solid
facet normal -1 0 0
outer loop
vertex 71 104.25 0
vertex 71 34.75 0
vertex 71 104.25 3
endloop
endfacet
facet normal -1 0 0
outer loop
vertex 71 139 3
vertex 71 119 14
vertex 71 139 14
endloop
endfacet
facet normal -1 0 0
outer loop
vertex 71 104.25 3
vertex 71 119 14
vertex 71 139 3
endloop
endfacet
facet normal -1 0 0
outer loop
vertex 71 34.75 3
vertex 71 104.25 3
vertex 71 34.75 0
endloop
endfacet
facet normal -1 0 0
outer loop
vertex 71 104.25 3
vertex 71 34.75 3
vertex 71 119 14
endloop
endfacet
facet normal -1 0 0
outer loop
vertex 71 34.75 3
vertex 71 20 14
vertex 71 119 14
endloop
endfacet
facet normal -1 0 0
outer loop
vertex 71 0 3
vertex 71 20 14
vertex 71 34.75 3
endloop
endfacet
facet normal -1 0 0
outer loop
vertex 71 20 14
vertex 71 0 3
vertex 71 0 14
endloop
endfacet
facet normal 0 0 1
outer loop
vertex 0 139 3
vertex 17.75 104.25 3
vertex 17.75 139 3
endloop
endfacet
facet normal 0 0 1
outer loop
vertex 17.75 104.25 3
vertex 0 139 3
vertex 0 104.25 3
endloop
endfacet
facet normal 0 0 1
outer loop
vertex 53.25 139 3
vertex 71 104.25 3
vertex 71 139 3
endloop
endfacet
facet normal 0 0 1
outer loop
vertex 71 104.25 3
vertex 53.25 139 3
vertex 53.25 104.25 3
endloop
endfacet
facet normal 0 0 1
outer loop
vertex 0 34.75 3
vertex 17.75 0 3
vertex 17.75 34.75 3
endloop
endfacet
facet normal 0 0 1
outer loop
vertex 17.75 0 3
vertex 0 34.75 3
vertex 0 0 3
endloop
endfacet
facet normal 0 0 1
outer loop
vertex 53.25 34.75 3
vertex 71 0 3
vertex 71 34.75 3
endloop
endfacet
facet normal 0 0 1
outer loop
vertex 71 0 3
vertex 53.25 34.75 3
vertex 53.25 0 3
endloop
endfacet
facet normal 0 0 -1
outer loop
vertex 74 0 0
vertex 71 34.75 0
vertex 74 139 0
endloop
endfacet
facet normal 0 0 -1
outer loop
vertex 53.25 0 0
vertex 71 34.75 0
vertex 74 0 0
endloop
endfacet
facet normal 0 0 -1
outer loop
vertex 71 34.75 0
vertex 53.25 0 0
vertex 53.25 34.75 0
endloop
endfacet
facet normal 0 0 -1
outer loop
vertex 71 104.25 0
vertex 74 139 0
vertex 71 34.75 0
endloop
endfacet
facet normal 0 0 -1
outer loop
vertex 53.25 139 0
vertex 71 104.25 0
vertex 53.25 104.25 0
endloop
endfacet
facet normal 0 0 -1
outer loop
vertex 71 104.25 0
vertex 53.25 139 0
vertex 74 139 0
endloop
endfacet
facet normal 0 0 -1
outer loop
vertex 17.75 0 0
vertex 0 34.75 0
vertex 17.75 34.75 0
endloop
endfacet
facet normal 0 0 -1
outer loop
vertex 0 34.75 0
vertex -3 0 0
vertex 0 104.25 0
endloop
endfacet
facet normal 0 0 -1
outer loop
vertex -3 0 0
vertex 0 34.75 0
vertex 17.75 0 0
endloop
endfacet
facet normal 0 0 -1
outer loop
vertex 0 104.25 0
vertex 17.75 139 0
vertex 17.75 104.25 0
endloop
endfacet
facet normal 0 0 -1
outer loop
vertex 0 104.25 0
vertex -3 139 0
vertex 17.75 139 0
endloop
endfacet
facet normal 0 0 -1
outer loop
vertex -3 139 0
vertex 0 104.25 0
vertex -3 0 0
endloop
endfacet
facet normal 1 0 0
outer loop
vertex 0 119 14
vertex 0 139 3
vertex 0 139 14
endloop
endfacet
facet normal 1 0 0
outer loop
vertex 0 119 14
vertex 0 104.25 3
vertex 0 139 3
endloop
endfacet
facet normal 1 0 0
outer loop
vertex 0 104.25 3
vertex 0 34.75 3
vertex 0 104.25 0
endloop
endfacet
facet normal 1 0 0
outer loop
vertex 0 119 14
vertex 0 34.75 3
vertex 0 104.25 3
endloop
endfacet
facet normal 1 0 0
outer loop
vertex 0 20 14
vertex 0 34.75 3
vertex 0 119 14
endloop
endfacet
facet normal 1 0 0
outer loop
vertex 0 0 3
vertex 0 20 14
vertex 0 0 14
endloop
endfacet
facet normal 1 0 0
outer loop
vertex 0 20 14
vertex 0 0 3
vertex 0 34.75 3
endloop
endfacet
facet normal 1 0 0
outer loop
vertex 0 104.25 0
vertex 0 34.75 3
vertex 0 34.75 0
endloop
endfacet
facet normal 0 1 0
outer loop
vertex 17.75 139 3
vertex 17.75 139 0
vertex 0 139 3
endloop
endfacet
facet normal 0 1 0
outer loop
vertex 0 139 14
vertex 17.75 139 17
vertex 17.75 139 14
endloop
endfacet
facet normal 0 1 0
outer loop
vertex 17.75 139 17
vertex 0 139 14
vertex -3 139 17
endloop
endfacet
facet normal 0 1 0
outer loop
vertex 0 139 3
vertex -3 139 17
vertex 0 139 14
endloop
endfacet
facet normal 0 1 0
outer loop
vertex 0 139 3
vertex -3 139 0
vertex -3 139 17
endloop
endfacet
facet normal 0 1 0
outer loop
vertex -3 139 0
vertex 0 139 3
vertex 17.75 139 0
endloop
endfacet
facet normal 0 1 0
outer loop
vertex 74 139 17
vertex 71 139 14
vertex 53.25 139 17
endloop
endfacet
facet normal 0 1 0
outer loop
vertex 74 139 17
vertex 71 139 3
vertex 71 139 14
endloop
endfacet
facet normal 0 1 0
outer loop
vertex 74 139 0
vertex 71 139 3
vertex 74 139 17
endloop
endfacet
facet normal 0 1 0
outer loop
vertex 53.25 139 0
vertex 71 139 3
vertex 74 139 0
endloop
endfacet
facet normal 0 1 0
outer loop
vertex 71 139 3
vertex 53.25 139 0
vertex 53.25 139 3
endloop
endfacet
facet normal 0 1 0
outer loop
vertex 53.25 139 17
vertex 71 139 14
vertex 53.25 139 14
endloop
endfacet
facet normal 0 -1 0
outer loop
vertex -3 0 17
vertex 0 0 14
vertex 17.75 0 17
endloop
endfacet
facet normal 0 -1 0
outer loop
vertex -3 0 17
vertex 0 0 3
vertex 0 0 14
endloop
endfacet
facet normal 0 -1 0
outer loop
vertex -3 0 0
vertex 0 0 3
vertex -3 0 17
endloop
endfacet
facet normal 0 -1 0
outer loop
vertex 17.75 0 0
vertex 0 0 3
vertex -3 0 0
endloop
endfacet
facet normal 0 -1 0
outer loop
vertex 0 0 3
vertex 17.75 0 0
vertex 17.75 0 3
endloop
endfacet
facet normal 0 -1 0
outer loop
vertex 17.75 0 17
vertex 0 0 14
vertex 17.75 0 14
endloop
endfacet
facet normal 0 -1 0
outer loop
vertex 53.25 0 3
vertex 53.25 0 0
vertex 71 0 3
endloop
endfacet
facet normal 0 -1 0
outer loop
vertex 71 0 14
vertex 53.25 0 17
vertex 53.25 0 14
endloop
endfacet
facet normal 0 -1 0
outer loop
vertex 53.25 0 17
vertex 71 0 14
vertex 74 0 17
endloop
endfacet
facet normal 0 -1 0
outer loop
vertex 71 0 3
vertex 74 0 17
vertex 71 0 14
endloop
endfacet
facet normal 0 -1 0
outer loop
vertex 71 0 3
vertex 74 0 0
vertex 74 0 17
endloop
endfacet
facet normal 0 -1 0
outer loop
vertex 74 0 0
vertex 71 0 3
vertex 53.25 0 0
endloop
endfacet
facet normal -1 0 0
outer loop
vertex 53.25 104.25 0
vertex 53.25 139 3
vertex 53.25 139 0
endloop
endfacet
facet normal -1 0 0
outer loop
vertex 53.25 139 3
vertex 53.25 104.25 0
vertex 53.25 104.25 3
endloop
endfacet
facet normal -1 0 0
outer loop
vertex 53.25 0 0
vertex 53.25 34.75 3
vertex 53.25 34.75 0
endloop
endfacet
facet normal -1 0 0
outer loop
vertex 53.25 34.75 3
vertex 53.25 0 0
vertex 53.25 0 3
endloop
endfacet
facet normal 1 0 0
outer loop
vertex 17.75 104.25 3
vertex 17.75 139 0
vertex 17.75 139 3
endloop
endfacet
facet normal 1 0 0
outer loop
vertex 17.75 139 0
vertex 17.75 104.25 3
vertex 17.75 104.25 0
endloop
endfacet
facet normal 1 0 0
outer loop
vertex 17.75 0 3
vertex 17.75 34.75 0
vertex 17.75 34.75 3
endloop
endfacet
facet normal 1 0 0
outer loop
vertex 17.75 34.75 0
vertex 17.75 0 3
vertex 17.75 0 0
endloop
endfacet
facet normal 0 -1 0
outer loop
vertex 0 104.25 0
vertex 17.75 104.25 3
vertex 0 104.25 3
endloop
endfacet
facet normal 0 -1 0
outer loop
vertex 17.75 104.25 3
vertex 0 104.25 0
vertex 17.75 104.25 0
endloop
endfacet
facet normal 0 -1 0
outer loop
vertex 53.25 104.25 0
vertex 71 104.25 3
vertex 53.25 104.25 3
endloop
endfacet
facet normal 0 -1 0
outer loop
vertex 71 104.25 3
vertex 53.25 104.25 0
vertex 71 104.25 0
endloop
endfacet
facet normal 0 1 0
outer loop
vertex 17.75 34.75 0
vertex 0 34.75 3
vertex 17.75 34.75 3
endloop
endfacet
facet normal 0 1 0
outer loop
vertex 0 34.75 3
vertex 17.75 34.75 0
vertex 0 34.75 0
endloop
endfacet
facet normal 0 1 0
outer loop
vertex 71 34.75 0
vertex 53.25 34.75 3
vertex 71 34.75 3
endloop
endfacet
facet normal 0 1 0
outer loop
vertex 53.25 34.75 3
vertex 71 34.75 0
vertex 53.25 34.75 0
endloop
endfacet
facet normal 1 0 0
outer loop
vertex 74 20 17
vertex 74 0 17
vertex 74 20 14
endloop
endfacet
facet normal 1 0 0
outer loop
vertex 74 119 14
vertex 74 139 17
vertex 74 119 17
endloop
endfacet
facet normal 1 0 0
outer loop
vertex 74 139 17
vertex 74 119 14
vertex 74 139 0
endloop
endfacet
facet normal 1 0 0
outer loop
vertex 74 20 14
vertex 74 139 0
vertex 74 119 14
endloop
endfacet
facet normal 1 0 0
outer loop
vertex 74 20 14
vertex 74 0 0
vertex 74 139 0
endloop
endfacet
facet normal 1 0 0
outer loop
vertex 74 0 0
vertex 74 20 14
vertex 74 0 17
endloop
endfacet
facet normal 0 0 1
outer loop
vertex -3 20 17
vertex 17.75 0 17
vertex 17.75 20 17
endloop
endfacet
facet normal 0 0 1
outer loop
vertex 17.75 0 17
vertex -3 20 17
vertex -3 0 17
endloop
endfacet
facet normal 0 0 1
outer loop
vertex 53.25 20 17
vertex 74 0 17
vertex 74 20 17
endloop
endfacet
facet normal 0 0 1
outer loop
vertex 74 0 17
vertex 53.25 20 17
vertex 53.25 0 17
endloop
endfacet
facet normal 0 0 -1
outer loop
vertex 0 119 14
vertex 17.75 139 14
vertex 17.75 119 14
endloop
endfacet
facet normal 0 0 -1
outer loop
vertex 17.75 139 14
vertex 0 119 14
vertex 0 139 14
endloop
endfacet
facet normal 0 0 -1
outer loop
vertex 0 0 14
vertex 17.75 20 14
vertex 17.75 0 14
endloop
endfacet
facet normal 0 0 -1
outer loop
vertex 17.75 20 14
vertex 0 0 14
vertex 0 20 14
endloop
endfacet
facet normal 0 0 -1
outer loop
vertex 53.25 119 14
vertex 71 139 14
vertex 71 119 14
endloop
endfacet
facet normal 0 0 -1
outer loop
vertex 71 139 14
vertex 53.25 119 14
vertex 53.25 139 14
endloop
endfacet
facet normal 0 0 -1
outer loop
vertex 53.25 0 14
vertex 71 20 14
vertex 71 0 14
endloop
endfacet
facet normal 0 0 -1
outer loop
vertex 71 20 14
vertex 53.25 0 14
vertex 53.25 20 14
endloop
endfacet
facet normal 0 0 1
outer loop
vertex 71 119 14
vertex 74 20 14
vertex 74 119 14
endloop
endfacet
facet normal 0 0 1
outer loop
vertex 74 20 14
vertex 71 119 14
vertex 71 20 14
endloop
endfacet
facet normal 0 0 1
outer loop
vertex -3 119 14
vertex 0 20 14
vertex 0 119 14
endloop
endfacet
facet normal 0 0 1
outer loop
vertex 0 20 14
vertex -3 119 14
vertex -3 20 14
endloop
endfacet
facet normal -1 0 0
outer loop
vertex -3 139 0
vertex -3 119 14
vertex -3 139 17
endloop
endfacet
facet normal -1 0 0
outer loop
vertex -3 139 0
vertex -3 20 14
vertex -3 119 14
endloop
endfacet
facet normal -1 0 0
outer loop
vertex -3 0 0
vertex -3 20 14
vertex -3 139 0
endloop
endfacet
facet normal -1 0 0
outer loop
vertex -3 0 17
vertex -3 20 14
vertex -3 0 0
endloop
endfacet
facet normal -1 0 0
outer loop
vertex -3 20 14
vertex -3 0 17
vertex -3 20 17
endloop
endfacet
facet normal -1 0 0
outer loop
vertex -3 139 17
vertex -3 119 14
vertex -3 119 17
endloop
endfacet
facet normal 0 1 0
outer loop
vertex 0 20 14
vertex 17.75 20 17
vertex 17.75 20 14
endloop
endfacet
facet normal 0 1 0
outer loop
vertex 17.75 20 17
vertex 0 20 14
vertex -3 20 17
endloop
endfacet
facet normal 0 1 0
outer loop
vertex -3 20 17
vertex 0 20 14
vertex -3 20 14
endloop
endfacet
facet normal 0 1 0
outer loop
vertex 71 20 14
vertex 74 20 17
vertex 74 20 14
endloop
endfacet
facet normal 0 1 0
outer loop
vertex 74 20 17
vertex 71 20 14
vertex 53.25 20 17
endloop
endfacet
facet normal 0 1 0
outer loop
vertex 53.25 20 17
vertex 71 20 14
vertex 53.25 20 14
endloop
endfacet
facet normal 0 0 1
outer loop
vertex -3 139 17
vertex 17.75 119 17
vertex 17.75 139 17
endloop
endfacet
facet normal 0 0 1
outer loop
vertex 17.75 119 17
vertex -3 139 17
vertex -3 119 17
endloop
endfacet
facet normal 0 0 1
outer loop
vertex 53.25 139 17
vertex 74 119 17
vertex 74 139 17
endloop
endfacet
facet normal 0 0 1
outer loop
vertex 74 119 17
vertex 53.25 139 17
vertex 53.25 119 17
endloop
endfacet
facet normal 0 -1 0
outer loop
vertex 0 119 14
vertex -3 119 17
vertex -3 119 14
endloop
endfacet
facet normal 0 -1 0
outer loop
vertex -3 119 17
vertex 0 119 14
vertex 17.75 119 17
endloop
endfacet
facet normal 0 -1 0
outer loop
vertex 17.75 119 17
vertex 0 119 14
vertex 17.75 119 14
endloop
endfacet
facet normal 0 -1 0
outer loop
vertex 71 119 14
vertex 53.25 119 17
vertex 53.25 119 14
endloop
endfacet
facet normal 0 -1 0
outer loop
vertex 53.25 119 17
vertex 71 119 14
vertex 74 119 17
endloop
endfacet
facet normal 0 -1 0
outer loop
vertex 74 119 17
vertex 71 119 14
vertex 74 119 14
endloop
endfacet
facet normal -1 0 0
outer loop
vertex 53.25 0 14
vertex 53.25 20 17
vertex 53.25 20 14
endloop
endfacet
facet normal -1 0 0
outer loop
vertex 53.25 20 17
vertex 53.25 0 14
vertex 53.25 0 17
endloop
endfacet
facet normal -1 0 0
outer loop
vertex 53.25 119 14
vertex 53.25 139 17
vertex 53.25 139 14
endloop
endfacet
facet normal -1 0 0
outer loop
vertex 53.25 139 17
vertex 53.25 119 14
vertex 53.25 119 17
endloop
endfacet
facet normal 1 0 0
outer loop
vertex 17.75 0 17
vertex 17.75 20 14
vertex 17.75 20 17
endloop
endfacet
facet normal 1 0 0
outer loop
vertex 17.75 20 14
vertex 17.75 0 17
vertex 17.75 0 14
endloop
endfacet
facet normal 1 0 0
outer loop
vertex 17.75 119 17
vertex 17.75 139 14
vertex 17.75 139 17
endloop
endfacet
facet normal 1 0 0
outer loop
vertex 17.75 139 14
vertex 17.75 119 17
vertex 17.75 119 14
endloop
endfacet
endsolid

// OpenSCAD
// phone holder

padding = 1;

x = 70 + padding;
y = 138 + padding;

phone_h = 13 + padding;

base_h = 3;

top_holder_y = 20;

difference(){
    color("gold")
    cube([x,y,base_h]);

    translate([x/4,0,0])
    cube([x/2,y,base_h]);
    
    translate([0,y/4,0])
    cube([x,y/2,base_h]);
}

color("red")
translate([-base_h,0,0])
cube([base_h,y,phone_h]);

color("red")
translate([x,0,0])
cube([base_h,y,phone_h]);


difference(){
    union(){
translate([-base_h,
           0,
           phone_h])
cube([x + base_h *2,
      top_holder_y,
      base_h]);

translate([-base_h,
           y - top_holder_y,
           phone_h])
cube([x + base_h *2,
      top_holder_y,
      base_h]);
    }
        translate([x/4,0,0])
    cube([x/2,y,20]);
    }
